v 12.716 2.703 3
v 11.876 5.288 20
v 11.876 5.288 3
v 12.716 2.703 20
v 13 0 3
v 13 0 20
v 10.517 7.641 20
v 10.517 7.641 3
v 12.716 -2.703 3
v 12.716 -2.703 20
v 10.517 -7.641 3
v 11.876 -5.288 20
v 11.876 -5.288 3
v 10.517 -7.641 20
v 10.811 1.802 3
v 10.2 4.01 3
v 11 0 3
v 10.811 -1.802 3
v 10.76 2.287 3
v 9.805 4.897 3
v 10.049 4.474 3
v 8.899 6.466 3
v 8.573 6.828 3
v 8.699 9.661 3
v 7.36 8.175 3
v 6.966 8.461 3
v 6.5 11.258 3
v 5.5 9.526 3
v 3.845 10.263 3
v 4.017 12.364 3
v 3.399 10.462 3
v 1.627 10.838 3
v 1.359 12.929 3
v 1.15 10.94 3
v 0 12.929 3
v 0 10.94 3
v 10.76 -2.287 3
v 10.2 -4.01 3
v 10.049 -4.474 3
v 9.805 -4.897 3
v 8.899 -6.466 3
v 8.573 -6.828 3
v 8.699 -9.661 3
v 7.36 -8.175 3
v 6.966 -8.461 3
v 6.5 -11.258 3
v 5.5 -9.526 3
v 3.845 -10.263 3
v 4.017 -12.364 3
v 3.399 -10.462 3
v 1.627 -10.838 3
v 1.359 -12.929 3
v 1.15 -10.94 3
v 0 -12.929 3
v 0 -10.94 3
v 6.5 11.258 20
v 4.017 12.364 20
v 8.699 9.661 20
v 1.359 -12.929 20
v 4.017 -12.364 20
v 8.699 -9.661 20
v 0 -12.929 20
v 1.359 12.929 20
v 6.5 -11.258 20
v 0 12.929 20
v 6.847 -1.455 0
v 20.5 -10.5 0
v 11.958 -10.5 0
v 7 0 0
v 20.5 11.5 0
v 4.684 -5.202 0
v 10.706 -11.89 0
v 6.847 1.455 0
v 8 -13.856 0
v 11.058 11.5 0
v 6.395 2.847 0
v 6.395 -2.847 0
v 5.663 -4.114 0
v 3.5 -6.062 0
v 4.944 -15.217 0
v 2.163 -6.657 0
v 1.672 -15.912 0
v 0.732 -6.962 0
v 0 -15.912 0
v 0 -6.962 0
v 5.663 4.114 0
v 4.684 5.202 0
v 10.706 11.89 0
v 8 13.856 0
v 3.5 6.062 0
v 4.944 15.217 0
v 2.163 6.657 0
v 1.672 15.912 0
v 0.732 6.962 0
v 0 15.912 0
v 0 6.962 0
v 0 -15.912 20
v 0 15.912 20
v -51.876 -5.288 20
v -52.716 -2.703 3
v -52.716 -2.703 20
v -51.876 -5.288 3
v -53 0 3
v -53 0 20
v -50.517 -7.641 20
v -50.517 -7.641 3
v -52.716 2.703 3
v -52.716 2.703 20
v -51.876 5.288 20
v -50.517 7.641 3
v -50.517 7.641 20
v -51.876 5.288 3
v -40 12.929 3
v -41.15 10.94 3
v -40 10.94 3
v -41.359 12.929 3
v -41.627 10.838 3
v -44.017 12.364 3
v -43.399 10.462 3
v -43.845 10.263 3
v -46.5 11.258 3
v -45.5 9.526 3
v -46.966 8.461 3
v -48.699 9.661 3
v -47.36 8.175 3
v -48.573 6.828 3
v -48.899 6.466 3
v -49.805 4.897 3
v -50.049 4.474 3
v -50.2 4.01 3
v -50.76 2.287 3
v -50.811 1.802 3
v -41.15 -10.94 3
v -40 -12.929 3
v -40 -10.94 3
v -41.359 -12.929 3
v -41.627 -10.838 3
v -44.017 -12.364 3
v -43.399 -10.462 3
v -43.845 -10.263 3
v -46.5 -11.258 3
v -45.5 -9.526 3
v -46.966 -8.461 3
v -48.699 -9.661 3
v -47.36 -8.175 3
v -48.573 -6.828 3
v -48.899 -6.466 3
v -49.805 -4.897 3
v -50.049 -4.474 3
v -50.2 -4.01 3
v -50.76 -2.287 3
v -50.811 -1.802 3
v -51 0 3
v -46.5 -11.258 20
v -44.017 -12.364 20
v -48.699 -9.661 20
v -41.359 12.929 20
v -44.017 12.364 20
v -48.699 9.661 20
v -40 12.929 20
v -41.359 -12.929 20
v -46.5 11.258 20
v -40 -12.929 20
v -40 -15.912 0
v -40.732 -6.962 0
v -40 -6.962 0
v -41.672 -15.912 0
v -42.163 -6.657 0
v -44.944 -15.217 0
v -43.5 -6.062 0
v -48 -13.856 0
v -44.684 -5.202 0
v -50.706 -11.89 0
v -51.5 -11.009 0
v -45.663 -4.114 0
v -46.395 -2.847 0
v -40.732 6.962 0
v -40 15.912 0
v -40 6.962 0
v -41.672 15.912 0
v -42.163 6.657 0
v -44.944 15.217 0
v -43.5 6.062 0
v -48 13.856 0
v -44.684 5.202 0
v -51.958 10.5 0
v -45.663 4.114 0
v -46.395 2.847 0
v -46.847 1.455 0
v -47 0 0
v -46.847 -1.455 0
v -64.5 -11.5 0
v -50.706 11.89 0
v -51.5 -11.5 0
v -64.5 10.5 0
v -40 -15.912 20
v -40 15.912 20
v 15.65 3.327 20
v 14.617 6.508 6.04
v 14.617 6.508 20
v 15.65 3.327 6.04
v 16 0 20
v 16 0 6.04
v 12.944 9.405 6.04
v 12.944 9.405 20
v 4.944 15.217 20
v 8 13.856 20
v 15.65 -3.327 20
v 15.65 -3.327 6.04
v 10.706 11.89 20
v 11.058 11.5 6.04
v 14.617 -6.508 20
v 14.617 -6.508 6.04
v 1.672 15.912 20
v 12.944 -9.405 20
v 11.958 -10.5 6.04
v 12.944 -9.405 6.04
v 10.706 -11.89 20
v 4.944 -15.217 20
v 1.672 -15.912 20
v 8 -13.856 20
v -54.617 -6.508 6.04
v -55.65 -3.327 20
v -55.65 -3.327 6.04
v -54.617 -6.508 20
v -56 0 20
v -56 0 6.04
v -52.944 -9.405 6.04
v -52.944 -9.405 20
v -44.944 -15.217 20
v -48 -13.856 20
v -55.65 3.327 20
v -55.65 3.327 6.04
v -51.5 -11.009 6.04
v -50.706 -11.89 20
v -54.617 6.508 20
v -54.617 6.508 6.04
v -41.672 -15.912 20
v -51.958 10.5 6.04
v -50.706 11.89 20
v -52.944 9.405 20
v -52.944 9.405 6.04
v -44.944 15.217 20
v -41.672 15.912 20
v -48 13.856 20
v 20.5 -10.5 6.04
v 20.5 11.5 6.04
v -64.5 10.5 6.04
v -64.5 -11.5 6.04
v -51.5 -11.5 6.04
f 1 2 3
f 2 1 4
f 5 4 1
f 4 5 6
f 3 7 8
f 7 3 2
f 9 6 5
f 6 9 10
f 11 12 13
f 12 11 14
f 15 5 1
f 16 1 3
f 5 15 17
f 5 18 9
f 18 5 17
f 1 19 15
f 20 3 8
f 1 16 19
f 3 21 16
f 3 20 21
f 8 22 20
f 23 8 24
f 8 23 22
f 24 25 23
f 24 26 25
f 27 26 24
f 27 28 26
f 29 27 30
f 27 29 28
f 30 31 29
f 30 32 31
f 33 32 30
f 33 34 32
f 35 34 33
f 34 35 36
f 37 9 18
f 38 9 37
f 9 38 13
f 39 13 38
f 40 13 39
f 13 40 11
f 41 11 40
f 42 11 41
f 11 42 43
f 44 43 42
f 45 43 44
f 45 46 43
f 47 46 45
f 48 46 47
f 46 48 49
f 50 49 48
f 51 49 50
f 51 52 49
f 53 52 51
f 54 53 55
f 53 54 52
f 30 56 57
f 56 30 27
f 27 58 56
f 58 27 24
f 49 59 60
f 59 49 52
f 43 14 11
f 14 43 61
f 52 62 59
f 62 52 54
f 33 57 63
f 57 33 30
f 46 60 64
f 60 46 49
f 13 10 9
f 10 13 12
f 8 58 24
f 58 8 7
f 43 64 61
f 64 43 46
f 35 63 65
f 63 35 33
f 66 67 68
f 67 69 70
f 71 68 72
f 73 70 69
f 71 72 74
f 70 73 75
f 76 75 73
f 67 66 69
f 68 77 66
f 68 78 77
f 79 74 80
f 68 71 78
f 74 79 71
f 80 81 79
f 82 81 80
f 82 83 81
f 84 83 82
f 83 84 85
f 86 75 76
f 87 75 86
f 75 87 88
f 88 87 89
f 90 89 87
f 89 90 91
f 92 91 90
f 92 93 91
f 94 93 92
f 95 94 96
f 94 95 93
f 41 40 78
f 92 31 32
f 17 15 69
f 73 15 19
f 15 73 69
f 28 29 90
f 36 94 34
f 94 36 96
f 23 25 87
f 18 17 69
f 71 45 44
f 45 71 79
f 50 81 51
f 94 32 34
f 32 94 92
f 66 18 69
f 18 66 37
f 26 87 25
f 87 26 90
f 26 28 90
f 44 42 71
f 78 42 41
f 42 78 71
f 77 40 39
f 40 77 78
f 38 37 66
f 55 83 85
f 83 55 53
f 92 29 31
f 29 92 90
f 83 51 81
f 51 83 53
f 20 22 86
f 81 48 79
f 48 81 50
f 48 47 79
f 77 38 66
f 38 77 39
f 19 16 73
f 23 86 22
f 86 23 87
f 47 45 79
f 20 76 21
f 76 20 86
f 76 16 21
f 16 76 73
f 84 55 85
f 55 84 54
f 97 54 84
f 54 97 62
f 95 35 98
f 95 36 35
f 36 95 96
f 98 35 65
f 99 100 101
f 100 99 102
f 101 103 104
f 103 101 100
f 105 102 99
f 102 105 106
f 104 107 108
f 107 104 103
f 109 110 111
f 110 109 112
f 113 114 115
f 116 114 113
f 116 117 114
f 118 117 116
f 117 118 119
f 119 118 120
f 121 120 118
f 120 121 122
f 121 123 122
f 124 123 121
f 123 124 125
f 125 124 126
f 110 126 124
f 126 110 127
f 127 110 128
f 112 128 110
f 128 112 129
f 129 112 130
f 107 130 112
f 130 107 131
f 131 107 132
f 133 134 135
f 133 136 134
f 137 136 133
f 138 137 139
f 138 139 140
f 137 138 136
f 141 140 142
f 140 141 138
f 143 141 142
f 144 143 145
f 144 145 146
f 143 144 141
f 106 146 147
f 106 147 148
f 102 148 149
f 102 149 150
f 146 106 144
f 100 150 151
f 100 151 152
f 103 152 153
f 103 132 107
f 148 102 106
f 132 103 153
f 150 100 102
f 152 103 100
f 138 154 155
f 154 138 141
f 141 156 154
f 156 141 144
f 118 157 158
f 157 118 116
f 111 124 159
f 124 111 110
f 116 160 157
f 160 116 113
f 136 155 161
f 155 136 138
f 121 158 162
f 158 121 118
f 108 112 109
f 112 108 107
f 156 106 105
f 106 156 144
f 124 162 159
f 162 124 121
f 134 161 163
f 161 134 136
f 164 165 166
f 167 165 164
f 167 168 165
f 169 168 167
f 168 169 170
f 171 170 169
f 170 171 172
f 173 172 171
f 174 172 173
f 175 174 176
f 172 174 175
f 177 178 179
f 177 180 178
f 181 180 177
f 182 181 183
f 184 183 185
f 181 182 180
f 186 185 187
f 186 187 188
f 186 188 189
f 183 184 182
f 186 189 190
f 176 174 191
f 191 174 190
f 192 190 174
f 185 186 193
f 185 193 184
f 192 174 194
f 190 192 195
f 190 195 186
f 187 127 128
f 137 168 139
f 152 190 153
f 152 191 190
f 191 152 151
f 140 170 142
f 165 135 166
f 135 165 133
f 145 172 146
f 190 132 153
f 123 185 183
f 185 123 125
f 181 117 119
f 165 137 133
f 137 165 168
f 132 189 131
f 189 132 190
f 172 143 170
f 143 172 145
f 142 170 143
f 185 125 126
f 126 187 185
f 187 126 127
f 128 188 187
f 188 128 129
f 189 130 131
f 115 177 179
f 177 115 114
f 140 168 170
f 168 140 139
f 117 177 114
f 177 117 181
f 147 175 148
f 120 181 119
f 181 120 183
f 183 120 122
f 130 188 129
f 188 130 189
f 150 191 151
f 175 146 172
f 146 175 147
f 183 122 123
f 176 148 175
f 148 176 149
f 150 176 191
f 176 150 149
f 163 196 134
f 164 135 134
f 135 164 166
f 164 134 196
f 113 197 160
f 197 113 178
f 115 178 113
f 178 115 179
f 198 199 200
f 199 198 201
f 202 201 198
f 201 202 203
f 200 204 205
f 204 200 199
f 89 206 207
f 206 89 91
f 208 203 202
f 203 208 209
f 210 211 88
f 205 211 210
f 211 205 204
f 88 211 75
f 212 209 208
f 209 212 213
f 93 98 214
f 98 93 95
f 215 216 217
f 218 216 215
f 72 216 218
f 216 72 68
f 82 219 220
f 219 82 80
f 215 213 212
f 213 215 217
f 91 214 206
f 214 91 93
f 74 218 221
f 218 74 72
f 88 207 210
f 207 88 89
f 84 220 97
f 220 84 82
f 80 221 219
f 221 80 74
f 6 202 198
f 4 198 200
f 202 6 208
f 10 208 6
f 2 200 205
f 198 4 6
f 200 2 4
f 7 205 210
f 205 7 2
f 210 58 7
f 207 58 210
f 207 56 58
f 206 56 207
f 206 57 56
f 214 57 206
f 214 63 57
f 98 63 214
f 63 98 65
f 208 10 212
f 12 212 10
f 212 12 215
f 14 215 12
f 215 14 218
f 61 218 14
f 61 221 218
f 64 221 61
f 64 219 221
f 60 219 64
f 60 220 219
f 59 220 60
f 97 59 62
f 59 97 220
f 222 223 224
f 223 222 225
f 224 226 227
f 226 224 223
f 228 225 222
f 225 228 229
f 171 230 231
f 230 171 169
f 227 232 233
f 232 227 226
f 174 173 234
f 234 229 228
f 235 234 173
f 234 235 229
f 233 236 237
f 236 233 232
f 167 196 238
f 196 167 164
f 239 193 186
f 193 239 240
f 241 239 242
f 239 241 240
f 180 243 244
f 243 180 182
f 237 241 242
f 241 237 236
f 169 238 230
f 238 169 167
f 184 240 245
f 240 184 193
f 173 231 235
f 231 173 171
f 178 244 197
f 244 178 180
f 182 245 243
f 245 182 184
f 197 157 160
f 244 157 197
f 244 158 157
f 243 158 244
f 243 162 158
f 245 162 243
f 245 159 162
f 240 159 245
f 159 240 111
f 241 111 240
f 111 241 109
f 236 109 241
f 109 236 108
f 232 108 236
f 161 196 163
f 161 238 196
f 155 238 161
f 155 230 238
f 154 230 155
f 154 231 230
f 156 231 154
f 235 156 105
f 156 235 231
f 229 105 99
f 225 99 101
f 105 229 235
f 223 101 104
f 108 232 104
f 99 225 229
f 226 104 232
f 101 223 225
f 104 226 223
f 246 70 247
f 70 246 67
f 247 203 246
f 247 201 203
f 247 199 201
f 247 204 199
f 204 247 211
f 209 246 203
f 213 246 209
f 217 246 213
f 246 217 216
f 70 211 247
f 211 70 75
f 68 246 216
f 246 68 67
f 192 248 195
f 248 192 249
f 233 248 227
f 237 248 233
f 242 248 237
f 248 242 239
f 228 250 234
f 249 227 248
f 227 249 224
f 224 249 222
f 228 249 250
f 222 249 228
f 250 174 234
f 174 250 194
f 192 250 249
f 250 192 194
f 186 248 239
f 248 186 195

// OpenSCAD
h = 20;
innerr = 13;
outerr = 16;
pennyradius = 10;
pennyheight = 1.52;
length1 = 10;

module hollowcylinder() {
    difference() {
        cylinder(h, outerr, outerr);
        cylinder(h, innerr, innerr);
    }
}

module halfcylinder () {
    intersection() {
        hollowcylinder();
        translate([0,-outerr,0]) {
            cube([outerr,2*outerr,100]);
        }
    }
}

module rotatedhalfcyl() {
    translate([-40, 0, 0]) {
        rotate([0, 0, 180]) {
            halfcylinder();
        }
    }
}

module innerportion() {
    difference() {
        cylinder(3, innerr, innerr);
        cylinder(4.5, innerr - 6, innerr);
        
    }
}

module innerhalf(){
    intersection() {
        innerportion();
        translate([0, -innerr, 0]) cube([innerr, 2*innerr, 5]);
    }
}

module transinnerhalf() {
    translate([-40, 0, 0]) {
        rotate([0, 0, 180]) innerhalf();
    }
}

module pennystuff(length) {
    difference() {
        translate([outerr - 3.5, -1.05*pennyradius, 0]) cube([length*length1, 2.2*pennyradius, 2*pennyheight + 3]);
        cylinder(h, outerr, outerr);
    }
}

module entrance() {
    translate([-2, 0, 0]) pennystuff(1);
}

module exit() {
    rotate([0, 0, 180]) {
        translate([39, 0 , 0]) pennystuff(1.3); 
    }  
}

innerhalf();

transinnerhalf();

rotatedhalfcyl();

halfcylinder();

entrance();

exit();
